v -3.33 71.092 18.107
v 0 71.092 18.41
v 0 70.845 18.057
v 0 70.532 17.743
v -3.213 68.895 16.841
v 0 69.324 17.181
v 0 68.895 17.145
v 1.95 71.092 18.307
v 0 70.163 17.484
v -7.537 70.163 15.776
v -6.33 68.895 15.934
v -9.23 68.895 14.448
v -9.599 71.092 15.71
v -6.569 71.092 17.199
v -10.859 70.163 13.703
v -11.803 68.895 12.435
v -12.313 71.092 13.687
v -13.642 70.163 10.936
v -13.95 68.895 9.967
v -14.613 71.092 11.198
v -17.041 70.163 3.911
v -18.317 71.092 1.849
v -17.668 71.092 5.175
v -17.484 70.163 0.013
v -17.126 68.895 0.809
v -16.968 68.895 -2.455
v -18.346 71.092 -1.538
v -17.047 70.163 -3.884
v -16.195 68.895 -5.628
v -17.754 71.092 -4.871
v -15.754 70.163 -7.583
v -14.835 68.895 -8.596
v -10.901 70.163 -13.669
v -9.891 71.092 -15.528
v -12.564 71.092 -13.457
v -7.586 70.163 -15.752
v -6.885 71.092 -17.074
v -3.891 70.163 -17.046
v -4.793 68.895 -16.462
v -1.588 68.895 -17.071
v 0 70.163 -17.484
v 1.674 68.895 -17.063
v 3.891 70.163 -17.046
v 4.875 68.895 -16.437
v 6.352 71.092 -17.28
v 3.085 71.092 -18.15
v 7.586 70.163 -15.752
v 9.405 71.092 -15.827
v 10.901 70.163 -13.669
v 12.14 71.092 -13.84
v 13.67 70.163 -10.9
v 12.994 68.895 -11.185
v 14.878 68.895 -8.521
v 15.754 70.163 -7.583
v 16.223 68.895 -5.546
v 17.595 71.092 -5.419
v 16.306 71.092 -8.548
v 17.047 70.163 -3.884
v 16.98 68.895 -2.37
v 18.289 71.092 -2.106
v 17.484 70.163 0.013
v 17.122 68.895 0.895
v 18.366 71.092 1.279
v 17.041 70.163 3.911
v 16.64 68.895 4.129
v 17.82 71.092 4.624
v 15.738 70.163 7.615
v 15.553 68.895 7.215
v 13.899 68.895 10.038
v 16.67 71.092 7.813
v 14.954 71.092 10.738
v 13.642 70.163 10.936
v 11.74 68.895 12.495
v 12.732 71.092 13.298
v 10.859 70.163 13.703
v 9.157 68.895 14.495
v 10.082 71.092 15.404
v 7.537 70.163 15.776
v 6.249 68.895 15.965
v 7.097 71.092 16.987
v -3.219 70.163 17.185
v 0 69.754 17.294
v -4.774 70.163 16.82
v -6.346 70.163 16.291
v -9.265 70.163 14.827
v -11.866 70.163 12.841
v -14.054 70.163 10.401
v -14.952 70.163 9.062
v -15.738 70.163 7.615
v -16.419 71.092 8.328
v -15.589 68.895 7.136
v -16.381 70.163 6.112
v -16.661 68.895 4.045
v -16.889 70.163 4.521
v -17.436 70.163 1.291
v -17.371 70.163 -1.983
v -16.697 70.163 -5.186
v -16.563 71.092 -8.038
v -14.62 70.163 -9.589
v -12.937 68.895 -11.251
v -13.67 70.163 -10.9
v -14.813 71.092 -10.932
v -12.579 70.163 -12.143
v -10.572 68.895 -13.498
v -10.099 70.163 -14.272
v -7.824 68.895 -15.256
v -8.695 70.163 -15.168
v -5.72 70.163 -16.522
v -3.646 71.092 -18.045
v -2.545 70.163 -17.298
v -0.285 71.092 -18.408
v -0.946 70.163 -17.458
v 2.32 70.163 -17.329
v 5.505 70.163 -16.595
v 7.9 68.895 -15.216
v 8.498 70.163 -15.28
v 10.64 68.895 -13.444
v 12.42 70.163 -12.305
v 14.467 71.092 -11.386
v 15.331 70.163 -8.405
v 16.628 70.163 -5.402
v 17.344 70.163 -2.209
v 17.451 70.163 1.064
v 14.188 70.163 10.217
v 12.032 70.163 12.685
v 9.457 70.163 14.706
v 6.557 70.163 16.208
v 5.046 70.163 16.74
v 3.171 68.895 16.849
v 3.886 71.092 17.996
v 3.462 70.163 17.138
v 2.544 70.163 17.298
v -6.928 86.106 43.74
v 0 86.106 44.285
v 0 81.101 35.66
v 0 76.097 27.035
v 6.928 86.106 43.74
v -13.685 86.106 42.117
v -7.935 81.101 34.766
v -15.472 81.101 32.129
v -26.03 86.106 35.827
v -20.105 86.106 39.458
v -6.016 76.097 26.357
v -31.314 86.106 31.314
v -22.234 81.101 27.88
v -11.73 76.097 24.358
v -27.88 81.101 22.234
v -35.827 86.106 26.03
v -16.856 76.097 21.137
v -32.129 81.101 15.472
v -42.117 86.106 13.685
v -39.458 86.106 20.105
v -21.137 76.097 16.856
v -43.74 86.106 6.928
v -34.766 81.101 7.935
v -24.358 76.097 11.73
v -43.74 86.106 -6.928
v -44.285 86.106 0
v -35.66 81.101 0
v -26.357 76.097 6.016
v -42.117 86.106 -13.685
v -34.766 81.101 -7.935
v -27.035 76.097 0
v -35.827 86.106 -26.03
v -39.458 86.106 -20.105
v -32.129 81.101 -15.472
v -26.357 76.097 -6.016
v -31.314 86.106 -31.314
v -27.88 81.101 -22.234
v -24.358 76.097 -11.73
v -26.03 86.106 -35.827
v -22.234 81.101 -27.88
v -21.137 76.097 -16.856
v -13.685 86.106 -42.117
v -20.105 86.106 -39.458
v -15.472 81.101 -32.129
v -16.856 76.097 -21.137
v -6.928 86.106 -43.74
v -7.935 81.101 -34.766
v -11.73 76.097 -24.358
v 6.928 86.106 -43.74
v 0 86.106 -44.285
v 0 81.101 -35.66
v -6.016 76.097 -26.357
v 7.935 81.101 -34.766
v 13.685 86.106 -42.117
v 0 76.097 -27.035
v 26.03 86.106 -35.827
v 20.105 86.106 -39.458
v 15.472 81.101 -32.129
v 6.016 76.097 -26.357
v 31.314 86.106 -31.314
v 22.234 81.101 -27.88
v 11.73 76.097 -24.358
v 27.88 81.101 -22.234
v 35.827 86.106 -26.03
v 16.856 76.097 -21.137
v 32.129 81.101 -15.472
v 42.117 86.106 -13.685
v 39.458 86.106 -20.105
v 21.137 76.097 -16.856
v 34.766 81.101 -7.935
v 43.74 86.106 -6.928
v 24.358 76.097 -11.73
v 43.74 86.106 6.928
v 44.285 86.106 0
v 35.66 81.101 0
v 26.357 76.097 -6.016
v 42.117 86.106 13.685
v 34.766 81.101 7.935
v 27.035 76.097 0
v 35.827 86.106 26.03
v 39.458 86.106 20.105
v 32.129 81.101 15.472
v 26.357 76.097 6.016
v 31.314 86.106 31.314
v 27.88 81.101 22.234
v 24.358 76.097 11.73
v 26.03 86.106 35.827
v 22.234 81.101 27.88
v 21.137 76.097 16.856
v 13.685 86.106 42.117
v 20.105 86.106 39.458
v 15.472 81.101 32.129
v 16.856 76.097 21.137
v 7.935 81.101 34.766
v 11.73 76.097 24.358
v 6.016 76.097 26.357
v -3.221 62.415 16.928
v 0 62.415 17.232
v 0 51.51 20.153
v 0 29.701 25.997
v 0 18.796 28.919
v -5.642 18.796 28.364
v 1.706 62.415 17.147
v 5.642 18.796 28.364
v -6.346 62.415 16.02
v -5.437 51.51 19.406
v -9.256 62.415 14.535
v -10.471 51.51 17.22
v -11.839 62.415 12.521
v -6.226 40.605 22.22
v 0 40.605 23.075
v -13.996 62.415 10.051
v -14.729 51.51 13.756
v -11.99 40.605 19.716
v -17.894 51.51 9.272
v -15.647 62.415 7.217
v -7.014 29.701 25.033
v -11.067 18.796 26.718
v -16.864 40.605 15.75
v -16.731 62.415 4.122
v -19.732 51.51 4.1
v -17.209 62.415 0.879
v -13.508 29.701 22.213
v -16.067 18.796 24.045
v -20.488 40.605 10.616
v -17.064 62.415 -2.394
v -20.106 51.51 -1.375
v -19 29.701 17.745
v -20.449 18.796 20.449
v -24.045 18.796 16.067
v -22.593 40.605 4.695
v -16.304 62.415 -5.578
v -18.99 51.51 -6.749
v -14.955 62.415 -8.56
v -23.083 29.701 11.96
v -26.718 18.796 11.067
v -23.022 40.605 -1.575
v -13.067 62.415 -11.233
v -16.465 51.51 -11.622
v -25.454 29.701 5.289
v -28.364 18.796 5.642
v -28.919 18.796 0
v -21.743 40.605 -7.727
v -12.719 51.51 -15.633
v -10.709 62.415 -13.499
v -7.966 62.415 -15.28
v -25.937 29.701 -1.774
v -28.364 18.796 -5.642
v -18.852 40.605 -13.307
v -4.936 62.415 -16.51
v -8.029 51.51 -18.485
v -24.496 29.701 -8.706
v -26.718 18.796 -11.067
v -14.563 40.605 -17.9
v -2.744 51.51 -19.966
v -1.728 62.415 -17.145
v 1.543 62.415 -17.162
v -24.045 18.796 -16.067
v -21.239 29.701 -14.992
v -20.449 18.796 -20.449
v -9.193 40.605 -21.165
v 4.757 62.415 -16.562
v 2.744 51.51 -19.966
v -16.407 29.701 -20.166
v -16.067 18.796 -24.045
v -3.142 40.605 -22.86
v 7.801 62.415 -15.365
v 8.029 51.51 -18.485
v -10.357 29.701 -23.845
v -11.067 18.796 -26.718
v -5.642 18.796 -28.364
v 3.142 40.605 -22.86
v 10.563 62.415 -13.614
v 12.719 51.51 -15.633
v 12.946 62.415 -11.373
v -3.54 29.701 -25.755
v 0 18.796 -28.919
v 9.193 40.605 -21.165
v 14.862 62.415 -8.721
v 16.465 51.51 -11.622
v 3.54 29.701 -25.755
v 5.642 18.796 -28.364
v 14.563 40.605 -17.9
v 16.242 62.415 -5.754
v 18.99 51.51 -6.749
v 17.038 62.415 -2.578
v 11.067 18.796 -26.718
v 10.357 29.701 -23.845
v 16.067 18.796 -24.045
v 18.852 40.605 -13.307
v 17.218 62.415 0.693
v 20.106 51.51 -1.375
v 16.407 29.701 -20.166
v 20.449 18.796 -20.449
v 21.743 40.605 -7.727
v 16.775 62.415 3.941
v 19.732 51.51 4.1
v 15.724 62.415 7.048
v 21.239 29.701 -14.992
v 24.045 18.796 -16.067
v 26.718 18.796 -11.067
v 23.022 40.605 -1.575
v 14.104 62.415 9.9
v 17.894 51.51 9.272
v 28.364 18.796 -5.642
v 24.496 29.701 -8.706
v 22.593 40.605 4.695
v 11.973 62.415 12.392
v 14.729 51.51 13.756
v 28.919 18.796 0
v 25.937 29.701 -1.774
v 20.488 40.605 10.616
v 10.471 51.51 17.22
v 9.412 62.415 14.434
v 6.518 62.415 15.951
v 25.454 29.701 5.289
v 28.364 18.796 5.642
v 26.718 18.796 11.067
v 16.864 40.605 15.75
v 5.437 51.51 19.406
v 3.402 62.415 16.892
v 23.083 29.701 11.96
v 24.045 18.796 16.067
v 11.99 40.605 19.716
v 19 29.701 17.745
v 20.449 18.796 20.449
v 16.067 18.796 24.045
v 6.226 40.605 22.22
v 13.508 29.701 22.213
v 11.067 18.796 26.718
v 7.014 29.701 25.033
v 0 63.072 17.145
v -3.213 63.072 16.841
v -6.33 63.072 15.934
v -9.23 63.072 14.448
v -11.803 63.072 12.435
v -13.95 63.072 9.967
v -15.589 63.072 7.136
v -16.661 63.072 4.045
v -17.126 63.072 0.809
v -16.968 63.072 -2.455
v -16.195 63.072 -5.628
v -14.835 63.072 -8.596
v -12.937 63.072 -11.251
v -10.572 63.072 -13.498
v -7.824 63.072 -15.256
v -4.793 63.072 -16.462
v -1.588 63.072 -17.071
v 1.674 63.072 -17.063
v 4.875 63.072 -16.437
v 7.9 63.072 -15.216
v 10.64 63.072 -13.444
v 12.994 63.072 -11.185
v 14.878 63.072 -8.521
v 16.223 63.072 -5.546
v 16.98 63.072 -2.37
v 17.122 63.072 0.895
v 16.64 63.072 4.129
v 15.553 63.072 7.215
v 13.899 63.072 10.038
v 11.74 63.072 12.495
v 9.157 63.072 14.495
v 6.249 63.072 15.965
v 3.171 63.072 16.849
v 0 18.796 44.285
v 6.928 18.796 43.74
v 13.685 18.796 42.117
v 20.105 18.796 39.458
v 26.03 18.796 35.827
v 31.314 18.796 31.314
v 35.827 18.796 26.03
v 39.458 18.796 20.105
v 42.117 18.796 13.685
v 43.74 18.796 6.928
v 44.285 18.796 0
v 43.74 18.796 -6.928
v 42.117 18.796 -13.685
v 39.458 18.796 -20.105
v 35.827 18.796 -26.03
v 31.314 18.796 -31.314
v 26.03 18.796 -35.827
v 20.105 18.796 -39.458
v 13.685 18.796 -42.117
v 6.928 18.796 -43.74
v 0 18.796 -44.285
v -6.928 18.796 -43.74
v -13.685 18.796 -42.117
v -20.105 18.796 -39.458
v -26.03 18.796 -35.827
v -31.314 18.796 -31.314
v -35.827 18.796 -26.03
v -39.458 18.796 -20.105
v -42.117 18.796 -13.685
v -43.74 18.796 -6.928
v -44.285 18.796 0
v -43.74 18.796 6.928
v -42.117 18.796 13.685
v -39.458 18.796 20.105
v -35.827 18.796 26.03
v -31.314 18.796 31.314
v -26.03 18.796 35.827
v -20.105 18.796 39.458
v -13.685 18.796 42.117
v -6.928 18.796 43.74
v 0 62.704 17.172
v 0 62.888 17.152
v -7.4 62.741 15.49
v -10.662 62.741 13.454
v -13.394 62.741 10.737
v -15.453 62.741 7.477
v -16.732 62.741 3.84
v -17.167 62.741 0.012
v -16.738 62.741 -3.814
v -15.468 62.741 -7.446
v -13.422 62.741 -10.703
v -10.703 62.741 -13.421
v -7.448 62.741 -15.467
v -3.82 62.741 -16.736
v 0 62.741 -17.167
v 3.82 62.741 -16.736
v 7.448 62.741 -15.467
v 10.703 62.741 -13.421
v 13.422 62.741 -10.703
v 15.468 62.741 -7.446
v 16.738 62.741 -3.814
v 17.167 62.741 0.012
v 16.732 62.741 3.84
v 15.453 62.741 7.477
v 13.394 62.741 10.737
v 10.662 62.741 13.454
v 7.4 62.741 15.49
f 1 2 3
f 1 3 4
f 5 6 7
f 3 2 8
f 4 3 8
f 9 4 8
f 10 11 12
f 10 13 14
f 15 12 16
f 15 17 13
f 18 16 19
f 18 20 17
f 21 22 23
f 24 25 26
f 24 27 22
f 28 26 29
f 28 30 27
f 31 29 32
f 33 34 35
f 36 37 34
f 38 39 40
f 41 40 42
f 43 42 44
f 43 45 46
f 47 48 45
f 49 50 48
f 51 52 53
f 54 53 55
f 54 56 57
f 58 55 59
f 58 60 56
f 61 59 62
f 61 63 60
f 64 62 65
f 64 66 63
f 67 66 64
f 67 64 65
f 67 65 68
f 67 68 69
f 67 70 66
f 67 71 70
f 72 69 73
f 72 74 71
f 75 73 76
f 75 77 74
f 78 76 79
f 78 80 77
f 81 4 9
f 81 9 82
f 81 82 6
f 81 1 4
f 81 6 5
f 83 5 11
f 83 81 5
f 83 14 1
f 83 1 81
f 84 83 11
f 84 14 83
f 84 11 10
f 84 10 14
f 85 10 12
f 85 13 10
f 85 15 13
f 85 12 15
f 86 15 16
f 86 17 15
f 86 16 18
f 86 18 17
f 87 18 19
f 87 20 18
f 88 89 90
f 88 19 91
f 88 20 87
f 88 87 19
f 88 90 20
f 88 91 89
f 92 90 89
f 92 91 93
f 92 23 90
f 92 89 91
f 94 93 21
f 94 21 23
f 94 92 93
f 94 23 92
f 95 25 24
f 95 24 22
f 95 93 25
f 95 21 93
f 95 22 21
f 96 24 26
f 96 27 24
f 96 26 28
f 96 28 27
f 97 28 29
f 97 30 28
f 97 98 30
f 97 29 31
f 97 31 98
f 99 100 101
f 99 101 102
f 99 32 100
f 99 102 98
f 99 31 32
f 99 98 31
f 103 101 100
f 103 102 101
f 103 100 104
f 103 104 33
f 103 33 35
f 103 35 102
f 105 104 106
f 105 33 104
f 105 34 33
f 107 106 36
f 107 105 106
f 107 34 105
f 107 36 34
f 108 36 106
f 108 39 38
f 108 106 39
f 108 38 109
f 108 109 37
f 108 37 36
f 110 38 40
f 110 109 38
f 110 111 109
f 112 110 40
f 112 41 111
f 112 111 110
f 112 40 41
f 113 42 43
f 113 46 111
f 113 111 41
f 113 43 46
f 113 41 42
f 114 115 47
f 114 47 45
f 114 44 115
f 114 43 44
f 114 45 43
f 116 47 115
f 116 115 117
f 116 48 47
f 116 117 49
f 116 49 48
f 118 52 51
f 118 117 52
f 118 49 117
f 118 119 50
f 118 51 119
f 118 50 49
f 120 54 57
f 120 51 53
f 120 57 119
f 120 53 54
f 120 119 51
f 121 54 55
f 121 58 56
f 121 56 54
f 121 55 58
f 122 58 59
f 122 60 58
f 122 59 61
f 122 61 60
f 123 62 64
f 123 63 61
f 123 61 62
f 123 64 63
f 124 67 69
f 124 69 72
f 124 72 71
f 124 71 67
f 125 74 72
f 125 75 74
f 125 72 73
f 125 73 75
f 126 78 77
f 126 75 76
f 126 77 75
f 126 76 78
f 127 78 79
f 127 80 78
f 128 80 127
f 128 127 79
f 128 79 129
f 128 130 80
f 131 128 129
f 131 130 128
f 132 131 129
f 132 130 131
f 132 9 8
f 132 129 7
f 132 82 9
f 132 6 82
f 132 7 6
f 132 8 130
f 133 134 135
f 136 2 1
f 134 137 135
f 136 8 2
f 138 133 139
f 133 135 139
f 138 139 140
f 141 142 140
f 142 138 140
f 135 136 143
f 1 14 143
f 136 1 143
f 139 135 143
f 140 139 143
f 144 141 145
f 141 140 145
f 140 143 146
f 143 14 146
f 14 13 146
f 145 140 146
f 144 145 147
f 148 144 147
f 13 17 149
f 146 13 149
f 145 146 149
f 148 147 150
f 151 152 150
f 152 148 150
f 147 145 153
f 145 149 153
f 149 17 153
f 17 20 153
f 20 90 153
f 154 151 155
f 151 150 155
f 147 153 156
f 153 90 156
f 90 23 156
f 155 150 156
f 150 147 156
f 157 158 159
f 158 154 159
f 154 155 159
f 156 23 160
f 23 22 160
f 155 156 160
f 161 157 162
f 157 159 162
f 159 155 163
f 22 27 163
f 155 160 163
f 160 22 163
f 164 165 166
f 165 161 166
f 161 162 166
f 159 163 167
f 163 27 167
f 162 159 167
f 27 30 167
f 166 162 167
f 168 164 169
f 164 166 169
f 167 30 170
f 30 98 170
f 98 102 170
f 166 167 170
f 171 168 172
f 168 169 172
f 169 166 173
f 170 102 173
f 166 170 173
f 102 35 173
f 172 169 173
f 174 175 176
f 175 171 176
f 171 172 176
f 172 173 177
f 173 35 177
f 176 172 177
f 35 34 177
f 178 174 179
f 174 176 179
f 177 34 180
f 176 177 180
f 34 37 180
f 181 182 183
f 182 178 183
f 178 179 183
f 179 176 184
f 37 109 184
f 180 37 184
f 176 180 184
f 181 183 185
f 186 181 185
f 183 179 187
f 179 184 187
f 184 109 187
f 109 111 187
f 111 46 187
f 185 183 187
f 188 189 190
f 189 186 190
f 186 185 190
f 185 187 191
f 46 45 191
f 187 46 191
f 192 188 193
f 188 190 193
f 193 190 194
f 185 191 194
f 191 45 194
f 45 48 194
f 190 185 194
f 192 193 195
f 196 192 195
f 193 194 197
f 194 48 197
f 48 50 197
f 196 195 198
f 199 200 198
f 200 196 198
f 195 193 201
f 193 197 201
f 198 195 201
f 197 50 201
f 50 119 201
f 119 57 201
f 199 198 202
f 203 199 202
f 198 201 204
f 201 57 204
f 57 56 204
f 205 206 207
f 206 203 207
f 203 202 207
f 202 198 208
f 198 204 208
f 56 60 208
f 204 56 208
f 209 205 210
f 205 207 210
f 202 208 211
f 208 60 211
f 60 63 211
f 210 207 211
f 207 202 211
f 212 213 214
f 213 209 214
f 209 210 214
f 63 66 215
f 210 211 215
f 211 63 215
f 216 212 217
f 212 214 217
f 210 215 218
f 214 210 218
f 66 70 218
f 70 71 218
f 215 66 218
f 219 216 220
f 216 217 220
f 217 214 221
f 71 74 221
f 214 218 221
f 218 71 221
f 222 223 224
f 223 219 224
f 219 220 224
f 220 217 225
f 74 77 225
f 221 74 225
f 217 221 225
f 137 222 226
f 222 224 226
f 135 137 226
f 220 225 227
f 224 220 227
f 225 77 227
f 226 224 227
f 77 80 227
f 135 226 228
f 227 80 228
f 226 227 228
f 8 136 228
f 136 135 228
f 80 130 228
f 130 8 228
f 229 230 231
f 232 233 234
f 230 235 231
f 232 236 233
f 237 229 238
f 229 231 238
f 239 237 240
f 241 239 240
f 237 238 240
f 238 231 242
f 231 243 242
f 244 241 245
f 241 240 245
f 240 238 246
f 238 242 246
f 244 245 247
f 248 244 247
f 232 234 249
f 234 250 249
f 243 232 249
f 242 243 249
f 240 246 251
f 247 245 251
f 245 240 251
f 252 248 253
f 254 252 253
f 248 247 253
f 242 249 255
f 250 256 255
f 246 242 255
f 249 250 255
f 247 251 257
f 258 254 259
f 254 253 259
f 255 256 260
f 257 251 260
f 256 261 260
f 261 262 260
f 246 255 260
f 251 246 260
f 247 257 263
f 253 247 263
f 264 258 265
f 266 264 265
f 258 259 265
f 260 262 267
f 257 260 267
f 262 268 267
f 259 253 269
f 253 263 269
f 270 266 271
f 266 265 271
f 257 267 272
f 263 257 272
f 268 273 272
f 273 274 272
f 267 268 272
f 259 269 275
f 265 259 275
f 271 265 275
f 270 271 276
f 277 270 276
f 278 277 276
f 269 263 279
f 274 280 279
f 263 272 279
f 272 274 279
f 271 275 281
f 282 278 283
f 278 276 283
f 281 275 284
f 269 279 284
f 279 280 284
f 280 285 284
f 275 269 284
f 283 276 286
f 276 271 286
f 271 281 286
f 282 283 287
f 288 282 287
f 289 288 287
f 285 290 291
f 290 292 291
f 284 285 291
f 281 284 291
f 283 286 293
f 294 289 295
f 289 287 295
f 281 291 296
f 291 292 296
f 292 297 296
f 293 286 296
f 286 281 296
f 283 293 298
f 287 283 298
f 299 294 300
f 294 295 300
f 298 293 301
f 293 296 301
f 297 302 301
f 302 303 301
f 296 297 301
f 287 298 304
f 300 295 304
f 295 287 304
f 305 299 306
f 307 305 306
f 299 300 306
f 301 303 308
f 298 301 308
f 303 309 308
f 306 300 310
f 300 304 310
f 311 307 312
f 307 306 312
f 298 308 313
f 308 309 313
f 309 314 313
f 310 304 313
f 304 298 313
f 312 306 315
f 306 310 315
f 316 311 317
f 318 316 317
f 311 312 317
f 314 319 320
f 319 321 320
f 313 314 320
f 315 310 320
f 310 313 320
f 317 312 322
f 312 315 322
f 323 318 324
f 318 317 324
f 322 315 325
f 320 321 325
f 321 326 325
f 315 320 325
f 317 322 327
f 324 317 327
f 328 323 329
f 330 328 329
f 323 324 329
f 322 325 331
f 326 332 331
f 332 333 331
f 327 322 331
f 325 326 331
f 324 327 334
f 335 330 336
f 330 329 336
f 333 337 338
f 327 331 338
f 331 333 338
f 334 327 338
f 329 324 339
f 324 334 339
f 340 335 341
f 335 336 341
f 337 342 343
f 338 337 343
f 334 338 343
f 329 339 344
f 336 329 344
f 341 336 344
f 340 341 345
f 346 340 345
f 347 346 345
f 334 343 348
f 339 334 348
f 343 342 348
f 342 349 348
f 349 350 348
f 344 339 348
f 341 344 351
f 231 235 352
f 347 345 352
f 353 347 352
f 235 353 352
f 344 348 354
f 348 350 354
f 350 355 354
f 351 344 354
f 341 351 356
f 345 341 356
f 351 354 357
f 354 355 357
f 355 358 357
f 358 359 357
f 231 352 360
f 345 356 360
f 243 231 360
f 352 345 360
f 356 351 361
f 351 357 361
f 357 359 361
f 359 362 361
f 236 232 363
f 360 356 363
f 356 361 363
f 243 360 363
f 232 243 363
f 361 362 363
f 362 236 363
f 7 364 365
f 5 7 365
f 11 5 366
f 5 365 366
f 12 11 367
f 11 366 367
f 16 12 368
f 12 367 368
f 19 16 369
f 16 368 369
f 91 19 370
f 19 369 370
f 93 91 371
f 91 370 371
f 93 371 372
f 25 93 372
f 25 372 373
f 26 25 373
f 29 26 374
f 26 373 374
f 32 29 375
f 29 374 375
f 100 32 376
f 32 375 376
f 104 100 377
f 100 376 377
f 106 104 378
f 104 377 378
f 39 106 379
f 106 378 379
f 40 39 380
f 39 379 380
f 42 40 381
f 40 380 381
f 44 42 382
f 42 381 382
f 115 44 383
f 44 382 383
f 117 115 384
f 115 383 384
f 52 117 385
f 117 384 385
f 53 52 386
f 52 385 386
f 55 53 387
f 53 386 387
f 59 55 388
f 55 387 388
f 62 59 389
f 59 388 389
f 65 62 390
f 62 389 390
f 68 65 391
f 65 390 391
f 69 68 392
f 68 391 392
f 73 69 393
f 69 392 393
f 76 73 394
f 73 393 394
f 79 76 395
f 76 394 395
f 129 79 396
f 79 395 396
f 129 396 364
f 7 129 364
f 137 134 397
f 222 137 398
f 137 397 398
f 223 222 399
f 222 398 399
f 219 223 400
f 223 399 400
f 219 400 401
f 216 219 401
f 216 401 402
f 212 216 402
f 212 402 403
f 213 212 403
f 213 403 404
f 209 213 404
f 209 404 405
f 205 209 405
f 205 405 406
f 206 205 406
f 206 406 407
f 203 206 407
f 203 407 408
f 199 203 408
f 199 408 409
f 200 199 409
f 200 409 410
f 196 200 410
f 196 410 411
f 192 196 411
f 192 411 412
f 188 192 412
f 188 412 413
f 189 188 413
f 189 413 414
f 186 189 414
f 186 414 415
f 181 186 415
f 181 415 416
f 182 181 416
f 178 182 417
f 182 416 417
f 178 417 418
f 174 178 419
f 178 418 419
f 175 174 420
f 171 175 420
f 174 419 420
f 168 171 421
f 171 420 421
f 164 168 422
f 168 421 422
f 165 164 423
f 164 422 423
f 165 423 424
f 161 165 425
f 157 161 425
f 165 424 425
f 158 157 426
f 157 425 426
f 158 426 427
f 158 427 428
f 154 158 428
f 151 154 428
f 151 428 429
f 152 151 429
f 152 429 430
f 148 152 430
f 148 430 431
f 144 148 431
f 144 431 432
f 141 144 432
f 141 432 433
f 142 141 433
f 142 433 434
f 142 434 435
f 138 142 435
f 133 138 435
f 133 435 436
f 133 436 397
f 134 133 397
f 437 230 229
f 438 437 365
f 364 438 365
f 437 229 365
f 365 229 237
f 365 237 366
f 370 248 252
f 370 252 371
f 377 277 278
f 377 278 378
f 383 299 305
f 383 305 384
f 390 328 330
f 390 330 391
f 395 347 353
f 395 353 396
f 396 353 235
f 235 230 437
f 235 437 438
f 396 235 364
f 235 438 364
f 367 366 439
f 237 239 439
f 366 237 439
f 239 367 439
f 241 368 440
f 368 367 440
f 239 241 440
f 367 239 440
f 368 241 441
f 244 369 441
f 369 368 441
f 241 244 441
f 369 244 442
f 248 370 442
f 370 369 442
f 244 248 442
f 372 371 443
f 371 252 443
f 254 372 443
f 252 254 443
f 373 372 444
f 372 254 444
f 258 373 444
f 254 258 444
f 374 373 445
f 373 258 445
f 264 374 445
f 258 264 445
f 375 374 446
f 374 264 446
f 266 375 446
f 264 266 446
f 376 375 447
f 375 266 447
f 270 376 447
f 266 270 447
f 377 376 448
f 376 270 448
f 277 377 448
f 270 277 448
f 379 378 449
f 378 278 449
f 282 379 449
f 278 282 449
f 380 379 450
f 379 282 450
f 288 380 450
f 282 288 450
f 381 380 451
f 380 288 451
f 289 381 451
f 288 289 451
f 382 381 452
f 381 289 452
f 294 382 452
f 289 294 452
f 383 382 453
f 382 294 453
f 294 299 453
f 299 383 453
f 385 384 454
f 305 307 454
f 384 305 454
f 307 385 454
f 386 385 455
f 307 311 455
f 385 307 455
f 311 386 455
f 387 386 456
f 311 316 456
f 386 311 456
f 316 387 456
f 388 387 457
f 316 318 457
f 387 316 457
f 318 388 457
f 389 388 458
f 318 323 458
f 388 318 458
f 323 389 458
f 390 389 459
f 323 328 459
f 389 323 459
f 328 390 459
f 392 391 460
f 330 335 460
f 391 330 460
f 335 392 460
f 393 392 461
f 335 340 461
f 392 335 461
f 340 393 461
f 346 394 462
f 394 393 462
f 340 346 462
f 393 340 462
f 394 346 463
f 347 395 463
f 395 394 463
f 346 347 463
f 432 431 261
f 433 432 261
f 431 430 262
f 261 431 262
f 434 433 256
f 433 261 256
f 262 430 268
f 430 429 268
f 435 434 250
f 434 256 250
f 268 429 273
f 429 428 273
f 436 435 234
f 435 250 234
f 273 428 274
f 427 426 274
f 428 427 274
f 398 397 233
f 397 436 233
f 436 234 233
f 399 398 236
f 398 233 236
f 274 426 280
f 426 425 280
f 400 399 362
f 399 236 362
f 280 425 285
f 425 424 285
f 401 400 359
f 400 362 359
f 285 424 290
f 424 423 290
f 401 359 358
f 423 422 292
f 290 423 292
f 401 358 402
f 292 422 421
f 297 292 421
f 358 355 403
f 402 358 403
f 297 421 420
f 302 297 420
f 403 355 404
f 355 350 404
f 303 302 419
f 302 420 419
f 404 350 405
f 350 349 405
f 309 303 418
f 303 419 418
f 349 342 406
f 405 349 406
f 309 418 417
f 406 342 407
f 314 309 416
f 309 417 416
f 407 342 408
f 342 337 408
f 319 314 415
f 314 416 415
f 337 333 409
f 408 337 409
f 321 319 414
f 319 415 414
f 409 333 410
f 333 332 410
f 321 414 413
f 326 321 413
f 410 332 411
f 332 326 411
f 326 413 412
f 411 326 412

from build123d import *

# Parameters (mm, degrees)
SKETCH1_R            = 44.2849
BOSS_EXTRUDE1_DEPTH  = 86.106
FILLET1_R            = 2.54
MOVE_FACE1_OUTLINE_R = 44.2849
MOVE_FACE1_DEPTH     = 18.796


# Read off the part's stored shape, not the designer's step: Move Face1
with BuildPart() as part:
    # Sketch1 → Boss-Extrude1 (new body)
    with BuildSketch(Plane(origin=(0, 0, 0), x_dir=(1, 0, 0), z_dir=(0, 1, 0))):
        with Locations(Location((0, 0, 0), (0, 0, 270))):
            Circle(SKETCH1_R)
    extrude(amount=BOSS_EXTRUDE1_DEPTH)

    # Sketch2 → Cut-Revolve1 (revolve, cut)
    with BuildSketch(Plane.XY, mode=Mode.PRIVATE) as cut_revolve1_sk:
        Polygon((17.145, 70.358), (17.145, 62.738), (33.955596435, 0), (0, 0), (0, 86.106), (44.2849, 86.106), align=None)
    revolve(cut_revolve1_sk.sketch.rotate(Axis((0, 86.106, 0), (0, -1, 0)), 90), axis=Axis((0, 86.106, 0), (0, -1, 0)), mode=Mode.SUBTRACT)

    # Fillet1
    fillet1_edges = [part.edges().sort_by_distance(p)[0] for p in [
        (0, 70.358, -17.145),
        (0, 62.738, -17.145),
    ]]
    fillet(fillet1_edges, radius=FILLET1_R)

    # Move Face1 outline → Move Face1 (cut)
    with BuildSketch(Plane(origin=(0, 0, 0), x_dir=(1, 0, 0), z_dir=(0, 1, 0))):
        Circle(MOVE_FACE1_OUTLINE_R)
    extrude(amount=MOVE_FACE1_DEPTH, mode=Mode.SUBTRACT)


solid = part.part
